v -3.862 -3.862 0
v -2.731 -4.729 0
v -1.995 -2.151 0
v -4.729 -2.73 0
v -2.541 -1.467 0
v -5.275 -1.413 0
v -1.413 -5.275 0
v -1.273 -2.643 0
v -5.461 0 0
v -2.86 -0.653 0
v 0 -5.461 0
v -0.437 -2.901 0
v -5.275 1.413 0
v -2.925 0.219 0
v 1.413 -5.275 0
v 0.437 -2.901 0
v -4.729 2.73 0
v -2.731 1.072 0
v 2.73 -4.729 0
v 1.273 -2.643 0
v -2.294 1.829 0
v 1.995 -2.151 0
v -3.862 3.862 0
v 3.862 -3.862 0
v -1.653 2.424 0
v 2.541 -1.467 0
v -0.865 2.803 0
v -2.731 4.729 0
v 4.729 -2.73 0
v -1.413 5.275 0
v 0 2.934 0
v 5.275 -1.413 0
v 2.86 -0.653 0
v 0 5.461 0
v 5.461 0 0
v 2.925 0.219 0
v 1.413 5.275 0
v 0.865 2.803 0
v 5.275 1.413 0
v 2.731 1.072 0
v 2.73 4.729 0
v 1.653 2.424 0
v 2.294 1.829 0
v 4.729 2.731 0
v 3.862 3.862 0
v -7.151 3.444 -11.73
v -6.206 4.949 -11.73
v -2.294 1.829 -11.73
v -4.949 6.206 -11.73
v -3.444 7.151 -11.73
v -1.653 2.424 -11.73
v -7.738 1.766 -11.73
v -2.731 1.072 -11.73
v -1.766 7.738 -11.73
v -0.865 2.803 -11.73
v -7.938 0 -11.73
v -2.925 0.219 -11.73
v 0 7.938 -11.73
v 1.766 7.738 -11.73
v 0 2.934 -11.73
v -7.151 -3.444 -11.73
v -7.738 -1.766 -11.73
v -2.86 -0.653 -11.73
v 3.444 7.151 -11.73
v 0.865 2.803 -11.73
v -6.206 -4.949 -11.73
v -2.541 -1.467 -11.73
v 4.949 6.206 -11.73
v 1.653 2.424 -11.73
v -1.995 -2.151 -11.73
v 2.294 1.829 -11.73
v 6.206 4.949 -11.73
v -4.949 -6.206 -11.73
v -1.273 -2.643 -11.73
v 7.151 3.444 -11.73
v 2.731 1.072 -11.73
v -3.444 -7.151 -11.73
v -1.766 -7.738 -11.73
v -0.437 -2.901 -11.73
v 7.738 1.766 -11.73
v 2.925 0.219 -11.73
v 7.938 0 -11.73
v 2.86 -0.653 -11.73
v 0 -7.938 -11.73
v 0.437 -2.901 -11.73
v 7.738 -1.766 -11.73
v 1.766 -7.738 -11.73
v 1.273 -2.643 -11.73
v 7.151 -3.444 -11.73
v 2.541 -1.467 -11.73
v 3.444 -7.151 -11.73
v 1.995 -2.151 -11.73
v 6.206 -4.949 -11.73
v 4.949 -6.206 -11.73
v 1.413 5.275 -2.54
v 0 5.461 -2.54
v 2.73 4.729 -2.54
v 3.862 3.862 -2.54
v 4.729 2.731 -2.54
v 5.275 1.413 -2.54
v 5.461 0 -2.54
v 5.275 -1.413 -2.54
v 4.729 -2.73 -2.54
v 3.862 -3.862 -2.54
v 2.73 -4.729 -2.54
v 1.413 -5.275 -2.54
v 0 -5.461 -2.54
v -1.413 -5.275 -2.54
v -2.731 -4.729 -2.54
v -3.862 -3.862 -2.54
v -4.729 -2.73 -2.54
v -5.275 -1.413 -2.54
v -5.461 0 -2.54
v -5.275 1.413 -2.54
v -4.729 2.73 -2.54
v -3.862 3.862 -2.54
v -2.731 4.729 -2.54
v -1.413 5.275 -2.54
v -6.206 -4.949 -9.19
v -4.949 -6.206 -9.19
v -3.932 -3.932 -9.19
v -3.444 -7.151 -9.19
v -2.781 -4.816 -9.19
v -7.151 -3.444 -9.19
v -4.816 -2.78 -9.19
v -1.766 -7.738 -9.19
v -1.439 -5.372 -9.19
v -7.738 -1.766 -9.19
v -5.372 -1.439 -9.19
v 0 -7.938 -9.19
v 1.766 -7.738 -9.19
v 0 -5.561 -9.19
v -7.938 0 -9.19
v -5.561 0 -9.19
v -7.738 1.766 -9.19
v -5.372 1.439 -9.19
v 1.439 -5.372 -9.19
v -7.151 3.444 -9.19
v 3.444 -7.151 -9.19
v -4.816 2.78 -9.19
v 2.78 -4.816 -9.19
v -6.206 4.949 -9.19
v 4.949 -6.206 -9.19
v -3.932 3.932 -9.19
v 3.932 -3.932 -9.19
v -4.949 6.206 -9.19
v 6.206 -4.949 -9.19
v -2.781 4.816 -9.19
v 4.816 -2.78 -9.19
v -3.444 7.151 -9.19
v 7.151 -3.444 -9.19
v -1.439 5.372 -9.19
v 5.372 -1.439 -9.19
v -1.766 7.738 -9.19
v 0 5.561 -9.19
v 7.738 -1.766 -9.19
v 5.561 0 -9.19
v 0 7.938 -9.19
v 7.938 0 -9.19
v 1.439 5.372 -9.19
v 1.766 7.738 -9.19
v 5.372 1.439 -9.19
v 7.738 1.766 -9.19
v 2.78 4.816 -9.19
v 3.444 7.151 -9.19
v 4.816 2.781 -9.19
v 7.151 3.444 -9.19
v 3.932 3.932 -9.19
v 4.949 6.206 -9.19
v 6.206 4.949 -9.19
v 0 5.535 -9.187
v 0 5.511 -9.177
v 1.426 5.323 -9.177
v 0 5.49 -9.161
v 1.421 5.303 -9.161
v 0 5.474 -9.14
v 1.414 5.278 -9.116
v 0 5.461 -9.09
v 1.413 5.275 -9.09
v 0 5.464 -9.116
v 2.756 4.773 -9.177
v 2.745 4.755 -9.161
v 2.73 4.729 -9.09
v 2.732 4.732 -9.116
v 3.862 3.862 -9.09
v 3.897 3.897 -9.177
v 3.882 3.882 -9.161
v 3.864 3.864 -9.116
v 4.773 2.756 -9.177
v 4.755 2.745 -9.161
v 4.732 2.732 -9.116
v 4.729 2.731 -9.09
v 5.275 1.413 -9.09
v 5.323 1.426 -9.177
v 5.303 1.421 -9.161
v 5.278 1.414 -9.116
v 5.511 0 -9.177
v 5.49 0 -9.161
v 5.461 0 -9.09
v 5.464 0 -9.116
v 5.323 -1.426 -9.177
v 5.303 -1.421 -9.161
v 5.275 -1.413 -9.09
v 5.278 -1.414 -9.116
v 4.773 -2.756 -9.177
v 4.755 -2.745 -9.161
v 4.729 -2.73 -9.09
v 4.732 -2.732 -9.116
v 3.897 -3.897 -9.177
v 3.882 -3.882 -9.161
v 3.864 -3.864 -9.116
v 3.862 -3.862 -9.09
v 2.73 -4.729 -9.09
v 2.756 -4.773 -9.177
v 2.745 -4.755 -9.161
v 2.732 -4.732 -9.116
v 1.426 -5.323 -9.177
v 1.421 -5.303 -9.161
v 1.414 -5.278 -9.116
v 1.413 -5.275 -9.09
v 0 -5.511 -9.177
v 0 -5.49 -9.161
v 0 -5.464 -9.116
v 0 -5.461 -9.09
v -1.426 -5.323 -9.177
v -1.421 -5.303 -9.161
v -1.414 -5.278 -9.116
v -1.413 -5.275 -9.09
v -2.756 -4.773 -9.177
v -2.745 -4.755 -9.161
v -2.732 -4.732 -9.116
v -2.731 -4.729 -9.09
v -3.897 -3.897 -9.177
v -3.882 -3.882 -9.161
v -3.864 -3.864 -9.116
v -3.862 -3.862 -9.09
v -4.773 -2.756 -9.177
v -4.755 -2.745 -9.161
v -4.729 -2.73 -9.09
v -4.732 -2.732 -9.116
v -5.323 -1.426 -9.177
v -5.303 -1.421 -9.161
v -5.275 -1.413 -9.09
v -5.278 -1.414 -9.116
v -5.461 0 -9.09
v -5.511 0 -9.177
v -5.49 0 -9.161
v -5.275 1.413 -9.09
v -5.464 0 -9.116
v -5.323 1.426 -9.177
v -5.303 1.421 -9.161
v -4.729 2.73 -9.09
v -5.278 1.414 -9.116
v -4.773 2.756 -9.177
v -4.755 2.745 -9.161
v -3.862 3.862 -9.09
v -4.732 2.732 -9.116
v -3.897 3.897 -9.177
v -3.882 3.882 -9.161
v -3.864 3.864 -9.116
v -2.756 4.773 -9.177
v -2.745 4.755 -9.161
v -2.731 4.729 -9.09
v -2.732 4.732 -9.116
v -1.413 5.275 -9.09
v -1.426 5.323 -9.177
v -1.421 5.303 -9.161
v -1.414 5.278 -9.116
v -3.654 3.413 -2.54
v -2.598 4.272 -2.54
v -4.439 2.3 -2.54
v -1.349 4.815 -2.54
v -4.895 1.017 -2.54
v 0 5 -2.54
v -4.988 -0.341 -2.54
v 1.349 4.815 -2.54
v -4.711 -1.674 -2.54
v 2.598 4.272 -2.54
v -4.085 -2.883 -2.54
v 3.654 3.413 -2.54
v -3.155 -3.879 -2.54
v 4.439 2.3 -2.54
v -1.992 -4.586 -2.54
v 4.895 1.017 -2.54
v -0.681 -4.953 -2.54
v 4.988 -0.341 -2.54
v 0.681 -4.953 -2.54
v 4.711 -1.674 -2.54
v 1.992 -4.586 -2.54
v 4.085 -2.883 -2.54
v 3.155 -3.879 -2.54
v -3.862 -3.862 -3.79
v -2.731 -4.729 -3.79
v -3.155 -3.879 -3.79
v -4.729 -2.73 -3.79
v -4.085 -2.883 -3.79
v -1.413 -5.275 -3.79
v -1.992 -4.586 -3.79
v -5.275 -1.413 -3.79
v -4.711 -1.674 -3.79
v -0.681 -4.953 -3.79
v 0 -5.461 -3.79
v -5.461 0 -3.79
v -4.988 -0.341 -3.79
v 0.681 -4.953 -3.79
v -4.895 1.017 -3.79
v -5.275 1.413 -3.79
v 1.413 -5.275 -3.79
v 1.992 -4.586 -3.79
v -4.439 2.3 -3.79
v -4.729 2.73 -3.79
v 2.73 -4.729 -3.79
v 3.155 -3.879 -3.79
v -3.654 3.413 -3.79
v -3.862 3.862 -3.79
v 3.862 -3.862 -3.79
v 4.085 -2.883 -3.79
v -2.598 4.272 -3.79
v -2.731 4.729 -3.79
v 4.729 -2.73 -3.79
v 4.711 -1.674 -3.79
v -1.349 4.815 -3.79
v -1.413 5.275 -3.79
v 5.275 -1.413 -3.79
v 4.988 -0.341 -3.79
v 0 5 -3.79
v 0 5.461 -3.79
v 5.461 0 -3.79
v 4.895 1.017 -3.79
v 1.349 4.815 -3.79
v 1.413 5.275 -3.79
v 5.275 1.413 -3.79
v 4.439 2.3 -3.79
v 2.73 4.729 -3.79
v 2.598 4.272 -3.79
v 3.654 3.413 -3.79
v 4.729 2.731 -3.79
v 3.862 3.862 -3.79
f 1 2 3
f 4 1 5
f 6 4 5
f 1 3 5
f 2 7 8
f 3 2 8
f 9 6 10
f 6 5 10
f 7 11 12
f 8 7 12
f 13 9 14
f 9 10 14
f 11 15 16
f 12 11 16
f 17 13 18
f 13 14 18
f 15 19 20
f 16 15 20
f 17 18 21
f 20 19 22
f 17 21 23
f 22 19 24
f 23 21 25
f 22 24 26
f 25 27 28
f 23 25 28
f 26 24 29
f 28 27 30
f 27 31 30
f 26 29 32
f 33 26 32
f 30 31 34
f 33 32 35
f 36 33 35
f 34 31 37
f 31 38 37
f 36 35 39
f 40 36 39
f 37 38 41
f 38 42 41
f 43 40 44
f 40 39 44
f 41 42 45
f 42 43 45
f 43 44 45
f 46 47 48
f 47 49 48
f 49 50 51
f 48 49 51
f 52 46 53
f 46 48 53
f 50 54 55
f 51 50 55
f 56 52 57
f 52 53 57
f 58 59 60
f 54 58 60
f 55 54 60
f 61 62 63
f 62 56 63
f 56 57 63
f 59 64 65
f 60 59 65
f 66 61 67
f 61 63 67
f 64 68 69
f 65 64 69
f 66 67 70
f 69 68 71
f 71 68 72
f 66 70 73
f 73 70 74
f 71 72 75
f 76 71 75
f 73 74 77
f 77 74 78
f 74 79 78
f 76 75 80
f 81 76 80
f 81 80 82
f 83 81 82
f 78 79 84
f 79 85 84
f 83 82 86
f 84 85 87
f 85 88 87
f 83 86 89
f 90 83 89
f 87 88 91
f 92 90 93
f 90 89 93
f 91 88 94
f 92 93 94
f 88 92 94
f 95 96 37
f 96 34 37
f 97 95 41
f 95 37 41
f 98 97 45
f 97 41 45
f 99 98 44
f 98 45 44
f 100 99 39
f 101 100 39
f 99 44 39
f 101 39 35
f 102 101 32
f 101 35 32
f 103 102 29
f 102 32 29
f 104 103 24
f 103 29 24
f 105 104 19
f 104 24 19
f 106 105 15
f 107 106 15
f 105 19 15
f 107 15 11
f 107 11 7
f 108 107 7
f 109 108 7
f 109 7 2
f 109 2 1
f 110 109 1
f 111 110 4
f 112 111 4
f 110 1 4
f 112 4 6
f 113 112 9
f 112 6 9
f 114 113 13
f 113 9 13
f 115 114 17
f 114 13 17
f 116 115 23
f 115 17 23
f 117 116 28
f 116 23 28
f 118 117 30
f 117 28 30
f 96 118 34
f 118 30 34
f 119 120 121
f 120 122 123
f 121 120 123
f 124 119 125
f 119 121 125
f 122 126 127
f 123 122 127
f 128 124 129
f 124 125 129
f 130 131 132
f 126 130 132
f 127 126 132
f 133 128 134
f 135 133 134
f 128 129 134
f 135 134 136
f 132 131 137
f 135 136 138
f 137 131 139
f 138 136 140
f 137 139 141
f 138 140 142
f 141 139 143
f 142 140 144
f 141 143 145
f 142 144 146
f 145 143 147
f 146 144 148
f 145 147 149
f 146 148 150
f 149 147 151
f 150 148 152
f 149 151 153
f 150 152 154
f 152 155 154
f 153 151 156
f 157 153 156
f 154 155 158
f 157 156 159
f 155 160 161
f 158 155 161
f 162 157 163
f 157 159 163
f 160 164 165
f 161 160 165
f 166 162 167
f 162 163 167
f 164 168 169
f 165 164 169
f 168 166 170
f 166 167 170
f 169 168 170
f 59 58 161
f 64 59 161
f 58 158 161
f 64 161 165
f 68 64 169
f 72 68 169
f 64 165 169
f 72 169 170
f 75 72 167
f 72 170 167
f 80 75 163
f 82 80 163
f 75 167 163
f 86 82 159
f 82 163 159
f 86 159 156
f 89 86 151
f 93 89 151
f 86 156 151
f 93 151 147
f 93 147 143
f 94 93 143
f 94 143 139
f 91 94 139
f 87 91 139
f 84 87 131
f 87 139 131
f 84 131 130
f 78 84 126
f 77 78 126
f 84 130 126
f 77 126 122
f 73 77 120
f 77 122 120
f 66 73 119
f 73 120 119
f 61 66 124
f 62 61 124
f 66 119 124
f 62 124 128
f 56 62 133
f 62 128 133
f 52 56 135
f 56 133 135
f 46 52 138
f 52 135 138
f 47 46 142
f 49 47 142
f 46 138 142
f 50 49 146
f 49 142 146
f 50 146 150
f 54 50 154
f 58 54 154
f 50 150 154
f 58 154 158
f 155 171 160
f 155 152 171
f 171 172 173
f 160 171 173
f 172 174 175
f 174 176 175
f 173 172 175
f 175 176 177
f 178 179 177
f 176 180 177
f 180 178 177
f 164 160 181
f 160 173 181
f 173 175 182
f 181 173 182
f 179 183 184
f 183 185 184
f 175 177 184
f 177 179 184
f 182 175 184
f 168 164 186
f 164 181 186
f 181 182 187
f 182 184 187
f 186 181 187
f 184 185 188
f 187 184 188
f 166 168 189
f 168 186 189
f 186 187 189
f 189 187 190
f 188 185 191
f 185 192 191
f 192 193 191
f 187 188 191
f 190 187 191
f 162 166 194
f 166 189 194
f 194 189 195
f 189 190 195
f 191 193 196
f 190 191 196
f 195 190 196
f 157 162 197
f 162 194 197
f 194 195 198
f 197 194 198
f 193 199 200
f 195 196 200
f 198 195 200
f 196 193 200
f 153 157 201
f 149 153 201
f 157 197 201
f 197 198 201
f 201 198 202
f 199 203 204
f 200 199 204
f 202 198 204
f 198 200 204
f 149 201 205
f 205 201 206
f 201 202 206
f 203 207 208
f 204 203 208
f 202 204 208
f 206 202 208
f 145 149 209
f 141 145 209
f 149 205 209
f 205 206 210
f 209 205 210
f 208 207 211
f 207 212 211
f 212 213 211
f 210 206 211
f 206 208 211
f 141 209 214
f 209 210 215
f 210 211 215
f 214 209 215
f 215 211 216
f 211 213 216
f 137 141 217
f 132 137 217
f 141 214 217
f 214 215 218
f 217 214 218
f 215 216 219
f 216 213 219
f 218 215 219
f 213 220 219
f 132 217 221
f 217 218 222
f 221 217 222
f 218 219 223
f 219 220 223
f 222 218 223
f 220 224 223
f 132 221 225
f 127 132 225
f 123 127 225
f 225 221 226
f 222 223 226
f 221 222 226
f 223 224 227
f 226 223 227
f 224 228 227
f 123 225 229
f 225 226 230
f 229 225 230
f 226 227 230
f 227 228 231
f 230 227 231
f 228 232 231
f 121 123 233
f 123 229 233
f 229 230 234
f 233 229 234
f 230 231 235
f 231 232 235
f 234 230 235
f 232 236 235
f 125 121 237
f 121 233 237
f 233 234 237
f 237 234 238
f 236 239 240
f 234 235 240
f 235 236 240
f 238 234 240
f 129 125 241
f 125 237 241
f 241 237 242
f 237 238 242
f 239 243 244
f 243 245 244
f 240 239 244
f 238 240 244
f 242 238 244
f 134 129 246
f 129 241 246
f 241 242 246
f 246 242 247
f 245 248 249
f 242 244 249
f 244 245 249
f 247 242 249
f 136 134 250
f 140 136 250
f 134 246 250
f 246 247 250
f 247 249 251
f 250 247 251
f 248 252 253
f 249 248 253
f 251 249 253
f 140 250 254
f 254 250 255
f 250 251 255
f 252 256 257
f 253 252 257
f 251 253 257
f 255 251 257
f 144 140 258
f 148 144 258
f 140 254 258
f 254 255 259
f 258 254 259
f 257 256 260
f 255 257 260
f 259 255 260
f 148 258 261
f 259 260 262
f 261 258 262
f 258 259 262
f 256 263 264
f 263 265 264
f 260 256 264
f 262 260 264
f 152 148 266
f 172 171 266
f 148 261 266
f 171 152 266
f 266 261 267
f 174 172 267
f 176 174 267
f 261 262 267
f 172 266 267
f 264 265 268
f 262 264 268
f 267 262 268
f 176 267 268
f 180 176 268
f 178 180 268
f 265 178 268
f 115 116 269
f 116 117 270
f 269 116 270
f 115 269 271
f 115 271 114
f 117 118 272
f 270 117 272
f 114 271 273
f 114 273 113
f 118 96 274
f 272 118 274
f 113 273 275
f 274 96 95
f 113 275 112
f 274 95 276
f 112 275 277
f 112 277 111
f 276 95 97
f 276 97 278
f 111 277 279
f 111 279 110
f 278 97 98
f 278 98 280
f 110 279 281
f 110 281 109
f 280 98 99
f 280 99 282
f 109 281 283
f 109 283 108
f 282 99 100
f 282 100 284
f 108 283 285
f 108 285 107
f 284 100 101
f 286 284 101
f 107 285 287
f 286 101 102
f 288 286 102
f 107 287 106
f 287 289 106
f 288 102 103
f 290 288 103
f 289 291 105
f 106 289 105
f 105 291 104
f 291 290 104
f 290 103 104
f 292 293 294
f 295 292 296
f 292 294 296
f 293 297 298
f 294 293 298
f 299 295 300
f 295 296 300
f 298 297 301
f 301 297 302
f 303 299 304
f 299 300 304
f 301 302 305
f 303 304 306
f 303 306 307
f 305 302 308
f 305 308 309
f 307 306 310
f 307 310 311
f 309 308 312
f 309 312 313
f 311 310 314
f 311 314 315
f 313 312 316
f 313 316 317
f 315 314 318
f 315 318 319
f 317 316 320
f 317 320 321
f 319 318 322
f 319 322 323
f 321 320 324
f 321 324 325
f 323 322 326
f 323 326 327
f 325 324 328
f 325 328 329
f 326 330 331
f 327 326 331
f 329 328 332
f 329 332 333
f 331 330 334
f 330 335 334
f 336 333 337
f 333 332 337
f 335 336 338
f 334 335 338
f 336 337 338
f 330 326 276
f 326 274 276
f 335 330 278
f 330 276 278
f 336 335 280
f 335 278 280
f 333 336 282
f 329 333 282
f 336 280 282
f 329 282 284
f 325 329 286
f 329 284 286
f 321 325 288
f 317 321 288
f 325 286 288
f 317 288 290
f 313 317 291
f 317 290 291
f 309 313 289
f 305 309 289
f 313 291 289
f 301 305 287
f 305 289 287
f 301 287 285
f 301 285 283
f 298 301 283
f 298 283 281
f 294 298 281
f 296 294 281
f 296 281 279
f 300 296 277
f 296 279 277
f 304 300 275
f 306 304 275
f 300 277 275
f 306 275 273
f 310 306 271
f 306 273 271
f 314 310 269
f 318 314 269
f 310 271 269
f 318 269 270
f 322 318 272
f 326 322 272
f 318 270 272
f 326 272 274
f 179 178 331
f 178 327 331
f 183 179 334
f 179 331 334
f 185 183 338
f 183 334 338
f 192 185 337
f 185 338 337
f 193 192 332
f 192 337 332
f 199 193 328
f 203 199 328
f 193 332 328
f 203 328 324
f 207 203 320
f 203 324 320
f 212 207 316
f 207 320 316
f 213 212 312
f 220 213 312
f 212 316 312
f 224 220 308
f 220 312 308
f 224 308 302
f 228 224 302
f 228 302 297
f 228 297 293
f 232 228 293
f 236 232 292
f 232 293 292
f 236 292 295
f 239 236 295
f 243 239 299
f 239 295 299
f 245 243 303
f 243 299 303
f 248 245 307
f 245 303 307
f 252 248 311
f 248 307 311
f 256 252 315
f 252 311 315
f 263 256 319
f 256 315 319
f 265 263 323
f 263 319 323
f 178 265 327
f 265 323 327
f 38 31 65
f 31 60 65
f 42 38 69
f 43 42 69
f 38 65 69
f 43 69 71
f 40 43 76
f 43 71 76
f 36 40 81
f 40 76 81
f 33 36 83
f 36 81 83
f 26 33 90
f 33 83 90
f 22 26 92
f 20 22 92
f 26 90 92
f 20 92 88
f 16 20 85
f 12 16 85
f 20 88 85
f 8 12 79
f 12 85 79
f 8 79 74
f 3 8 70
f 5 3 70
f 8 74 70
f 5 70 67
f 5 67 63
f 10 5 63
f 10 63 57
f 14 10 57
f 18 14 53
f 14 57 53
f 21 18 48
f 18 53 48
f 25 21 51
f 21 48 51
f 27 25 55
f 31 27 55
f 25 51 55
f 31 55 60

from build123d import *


with BuildPart() as part:
    # Sketch1 → Revolve1 (revolve)
    with BuildSketch(Plane(origin=(0, 0, 0), x_dir=(0, 0, -1), z_dir=(1, 0, 0))):
        with BuildLine():
            Line((0, 2.9337), (11.73, 2.9337))
            Line((11.73, 2.9337), (11.73, 7.9375))
            Line((11.73, 7.9375), (9.19, 7.9375))
            Line((9.19, 7.9375), (9.19, 5.561))
            ThreePointArc((9.19, 5.561), (9.160710678, 5.490289322), (9.09, 5.461))
            Line((9.09, 5.461), (3.79, 5.461))
            Line((3.79, 5.461), (3.79, 5))
            Line((3.79, 5), (2.54, 5))
            Line((2.54, 5), (2.54, 5.461))
            Line((2.54, 5.461), (0, 5.461))
            Line((0, 5.461), (0, 2.9337))
        make_face()
    revolve(axis=Axis((0, 0, 0), (0, 0, -1)))


solid = part.part
